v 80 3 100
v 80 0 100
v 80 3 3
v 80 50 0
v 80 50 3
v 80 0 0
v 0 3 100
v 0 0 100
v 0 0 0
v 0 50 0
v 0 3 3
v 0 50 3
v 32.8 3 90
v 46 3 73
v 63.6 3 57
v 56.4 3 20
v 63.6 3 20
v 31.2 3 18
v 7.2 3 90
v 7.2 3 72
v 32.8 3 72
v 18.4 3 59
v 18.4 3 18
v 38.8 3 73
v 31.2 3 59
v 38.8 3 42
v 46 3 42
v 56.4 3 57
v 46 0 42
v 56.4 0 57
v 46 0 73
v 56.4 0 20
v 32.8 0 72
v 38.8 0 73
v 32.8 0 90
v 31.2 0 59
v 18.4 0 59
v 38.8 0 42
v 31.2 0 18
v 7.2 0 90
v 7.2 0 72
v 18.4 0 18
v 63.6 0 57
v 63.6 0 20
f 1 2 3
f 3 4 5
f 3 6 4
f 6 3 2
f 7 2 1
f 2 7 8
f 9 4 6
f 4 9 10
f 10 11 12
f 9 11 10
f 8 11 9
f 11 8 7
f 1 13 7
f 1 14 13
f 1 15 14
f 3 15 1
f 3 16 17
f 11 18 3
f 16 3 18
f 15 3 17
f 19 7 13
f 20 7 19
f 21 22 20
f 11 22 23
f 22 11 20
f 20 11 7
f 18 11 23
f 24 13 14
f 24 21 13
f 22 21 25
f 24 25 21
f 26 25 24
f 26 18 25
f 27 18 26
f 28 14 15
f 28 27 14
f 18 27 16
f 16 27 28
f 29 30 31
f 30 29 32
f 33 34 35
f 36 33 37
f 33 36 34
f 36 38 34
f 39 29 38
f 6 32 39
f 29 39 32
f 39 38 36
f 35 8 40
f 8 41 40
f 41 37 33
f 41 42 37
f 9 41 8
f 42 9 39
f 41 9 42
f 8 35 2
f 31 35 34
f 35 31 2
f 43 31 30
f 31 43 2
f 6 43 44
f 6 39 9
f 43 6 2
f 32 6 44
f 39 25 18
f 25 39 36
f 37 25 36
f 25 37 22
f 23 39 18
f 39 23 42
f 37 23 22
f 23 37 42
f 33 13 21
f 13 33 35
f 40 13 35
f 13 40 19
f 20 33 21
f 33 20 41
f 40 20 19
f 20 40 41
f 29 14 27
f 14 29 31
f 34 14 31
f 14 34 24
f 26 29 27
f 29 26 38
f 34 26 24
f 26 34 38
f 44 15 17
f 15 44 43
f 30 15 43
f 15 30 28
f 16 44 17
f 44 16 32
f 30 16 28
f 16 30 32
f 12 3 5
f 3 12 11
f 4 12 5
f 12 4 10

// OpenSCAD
// L-Shaped Bookend — parametric OpenSCAD
// Generated from sketch: front view (back panel face with 4 cutouts) + right view (L-profile)
// Build orientation: flat base on Z=0

// ===== USER PARAMETERS (top-level, named for Modify Design sliders) =====
H = 100;      // Overall height (back panel) [mm]
W = 80;       // Width (panel width = base width) [mm]
D = 50;       // Base depth (front-to-back) [mm]
T = 3;        // Uniform wall thickness [mm]
$fn = 96;     // Circle/arc resolution

// ===== DERIVED / INTERNAL =====
// Cutout proportions (fractions of W and H) — derived from front-view sketch
// Cutout 1: middle-left vertical slot
C1_X_FRAC   = 0.31;   // center X / W
C1_W_FRAC   = 0.16;   // width / W
C1_Z_LO_FRAC = 0.18;  // bottom Z / H
C1_Z_HI_FRAC = 0.59;  // top Z / H

// Cutout 2: top horizontal slot
C2_X_FRAC   = 0.25;
C2_W_FRAC   = 0.32;
C2_Z_LO_FRAC = 0.72;
C2_Z_HI_FRAC = 0.90;

// Cutout 3: center vertical slot
C3_X_FRAC   = 0.53;
C3_W_FRAC   = 0.09;
C3_Z_LO_FRAC = 0.42;
C3_Z_HI_FRAC = 0.73;

// Cutout 4: right vertical slot
C4_X_FRAC   = 0.75;
C4_W_FRAC   = 0.09;
C4_Z_LO_FRAC = 0.20;
C4_Z_HI_FRAC = 0.57;

// Computed cutout geometry (mm)
C1_X = C1_X_FRAC * W;
C1_W = C1_W_FRAC * W;
C1_Z_LO = C1_Z_LO_FRAC * H;
C1_Z_HI = C1_Z_HI_FRAC * H;
C1_H = C1_Z_HI - C1_Z_LO;

C2_X = C2_X_FRAC * W;
C2_W = C2_W_FRAC * W;
C2_Z_LO = C2_Z_LO_FRAC * H;
C2_Z_HI = C2_Z_HI_FRAC * H;
C2_H = C2_Z_HI - C2_Z_LO;

C3_X = C3_X_FRAC * W;
C3_W = C3_W_FRAC * W;
C3_Z_LO = C3_Z_LO_FRAC * H;
C3_Z_HI = C3_Z_HI_FRAC * H;
C3_H = C3_Z_HI - C3_Z_LO;

C4_X = C4_X_FRAC * W;
C4_W = C4_W_FRAC * W;
C4_Z_LO = C4_Z_LO_FRAC * H;
C4_Z_HI = C4_Z_HI_FRAC * H;
C4_H = C4_Z_HI - C4_Z_LO;

// ===== MODULES =====
module back_panel() {
    // Vertical back panel: X=[0,W], Y=[0,T], Z=[0,H]
    // With 4 through-holes subtracted (cut along Y, full thickness T)
    difference() {
        // Solid panel
        cube([W, T, H]);
        
        // Cutout 1: middle-left vertical
        translate([C1_X - C1_W/2, -0.5, C1_Z_LO])
            cube([C1_W, T + 1, C1_H]);
        
        // Cutout 2: top horizontal
        translate([C2_X - C2_W/2, -0.5, C2_Z_LO])
            cube([C2_W, T + 1, C2_H]);
        
        // Cutout 3: center vertical
        translate([C3_X - C3_W/2, -0.5, C3_Z_LO])
            cube([C3_W, T + 1, C3_H]);
        
        // Cutout 4: right vertical
        translate([C4_X - C4_W/2, -0.5, C4_Z_LO])
            cube([C4_W, T + 1, C4_H]);
    }
}

module base() {
    // Horizontal base: X=[0,W], Y=[0,D], Z=[0,T]
    cube([W, D, T]);
}

module bookend() {
    // Union of base + back panel with VOLUMETRIC OVERLAP at the L-corner
    // Overlap region: X=[0,W], Y=[0,T], Z=[0,T] — shared by both parts
    union() {
        base();
        back_panel();
    }
}

// ===== RENDER =====
bookend();
